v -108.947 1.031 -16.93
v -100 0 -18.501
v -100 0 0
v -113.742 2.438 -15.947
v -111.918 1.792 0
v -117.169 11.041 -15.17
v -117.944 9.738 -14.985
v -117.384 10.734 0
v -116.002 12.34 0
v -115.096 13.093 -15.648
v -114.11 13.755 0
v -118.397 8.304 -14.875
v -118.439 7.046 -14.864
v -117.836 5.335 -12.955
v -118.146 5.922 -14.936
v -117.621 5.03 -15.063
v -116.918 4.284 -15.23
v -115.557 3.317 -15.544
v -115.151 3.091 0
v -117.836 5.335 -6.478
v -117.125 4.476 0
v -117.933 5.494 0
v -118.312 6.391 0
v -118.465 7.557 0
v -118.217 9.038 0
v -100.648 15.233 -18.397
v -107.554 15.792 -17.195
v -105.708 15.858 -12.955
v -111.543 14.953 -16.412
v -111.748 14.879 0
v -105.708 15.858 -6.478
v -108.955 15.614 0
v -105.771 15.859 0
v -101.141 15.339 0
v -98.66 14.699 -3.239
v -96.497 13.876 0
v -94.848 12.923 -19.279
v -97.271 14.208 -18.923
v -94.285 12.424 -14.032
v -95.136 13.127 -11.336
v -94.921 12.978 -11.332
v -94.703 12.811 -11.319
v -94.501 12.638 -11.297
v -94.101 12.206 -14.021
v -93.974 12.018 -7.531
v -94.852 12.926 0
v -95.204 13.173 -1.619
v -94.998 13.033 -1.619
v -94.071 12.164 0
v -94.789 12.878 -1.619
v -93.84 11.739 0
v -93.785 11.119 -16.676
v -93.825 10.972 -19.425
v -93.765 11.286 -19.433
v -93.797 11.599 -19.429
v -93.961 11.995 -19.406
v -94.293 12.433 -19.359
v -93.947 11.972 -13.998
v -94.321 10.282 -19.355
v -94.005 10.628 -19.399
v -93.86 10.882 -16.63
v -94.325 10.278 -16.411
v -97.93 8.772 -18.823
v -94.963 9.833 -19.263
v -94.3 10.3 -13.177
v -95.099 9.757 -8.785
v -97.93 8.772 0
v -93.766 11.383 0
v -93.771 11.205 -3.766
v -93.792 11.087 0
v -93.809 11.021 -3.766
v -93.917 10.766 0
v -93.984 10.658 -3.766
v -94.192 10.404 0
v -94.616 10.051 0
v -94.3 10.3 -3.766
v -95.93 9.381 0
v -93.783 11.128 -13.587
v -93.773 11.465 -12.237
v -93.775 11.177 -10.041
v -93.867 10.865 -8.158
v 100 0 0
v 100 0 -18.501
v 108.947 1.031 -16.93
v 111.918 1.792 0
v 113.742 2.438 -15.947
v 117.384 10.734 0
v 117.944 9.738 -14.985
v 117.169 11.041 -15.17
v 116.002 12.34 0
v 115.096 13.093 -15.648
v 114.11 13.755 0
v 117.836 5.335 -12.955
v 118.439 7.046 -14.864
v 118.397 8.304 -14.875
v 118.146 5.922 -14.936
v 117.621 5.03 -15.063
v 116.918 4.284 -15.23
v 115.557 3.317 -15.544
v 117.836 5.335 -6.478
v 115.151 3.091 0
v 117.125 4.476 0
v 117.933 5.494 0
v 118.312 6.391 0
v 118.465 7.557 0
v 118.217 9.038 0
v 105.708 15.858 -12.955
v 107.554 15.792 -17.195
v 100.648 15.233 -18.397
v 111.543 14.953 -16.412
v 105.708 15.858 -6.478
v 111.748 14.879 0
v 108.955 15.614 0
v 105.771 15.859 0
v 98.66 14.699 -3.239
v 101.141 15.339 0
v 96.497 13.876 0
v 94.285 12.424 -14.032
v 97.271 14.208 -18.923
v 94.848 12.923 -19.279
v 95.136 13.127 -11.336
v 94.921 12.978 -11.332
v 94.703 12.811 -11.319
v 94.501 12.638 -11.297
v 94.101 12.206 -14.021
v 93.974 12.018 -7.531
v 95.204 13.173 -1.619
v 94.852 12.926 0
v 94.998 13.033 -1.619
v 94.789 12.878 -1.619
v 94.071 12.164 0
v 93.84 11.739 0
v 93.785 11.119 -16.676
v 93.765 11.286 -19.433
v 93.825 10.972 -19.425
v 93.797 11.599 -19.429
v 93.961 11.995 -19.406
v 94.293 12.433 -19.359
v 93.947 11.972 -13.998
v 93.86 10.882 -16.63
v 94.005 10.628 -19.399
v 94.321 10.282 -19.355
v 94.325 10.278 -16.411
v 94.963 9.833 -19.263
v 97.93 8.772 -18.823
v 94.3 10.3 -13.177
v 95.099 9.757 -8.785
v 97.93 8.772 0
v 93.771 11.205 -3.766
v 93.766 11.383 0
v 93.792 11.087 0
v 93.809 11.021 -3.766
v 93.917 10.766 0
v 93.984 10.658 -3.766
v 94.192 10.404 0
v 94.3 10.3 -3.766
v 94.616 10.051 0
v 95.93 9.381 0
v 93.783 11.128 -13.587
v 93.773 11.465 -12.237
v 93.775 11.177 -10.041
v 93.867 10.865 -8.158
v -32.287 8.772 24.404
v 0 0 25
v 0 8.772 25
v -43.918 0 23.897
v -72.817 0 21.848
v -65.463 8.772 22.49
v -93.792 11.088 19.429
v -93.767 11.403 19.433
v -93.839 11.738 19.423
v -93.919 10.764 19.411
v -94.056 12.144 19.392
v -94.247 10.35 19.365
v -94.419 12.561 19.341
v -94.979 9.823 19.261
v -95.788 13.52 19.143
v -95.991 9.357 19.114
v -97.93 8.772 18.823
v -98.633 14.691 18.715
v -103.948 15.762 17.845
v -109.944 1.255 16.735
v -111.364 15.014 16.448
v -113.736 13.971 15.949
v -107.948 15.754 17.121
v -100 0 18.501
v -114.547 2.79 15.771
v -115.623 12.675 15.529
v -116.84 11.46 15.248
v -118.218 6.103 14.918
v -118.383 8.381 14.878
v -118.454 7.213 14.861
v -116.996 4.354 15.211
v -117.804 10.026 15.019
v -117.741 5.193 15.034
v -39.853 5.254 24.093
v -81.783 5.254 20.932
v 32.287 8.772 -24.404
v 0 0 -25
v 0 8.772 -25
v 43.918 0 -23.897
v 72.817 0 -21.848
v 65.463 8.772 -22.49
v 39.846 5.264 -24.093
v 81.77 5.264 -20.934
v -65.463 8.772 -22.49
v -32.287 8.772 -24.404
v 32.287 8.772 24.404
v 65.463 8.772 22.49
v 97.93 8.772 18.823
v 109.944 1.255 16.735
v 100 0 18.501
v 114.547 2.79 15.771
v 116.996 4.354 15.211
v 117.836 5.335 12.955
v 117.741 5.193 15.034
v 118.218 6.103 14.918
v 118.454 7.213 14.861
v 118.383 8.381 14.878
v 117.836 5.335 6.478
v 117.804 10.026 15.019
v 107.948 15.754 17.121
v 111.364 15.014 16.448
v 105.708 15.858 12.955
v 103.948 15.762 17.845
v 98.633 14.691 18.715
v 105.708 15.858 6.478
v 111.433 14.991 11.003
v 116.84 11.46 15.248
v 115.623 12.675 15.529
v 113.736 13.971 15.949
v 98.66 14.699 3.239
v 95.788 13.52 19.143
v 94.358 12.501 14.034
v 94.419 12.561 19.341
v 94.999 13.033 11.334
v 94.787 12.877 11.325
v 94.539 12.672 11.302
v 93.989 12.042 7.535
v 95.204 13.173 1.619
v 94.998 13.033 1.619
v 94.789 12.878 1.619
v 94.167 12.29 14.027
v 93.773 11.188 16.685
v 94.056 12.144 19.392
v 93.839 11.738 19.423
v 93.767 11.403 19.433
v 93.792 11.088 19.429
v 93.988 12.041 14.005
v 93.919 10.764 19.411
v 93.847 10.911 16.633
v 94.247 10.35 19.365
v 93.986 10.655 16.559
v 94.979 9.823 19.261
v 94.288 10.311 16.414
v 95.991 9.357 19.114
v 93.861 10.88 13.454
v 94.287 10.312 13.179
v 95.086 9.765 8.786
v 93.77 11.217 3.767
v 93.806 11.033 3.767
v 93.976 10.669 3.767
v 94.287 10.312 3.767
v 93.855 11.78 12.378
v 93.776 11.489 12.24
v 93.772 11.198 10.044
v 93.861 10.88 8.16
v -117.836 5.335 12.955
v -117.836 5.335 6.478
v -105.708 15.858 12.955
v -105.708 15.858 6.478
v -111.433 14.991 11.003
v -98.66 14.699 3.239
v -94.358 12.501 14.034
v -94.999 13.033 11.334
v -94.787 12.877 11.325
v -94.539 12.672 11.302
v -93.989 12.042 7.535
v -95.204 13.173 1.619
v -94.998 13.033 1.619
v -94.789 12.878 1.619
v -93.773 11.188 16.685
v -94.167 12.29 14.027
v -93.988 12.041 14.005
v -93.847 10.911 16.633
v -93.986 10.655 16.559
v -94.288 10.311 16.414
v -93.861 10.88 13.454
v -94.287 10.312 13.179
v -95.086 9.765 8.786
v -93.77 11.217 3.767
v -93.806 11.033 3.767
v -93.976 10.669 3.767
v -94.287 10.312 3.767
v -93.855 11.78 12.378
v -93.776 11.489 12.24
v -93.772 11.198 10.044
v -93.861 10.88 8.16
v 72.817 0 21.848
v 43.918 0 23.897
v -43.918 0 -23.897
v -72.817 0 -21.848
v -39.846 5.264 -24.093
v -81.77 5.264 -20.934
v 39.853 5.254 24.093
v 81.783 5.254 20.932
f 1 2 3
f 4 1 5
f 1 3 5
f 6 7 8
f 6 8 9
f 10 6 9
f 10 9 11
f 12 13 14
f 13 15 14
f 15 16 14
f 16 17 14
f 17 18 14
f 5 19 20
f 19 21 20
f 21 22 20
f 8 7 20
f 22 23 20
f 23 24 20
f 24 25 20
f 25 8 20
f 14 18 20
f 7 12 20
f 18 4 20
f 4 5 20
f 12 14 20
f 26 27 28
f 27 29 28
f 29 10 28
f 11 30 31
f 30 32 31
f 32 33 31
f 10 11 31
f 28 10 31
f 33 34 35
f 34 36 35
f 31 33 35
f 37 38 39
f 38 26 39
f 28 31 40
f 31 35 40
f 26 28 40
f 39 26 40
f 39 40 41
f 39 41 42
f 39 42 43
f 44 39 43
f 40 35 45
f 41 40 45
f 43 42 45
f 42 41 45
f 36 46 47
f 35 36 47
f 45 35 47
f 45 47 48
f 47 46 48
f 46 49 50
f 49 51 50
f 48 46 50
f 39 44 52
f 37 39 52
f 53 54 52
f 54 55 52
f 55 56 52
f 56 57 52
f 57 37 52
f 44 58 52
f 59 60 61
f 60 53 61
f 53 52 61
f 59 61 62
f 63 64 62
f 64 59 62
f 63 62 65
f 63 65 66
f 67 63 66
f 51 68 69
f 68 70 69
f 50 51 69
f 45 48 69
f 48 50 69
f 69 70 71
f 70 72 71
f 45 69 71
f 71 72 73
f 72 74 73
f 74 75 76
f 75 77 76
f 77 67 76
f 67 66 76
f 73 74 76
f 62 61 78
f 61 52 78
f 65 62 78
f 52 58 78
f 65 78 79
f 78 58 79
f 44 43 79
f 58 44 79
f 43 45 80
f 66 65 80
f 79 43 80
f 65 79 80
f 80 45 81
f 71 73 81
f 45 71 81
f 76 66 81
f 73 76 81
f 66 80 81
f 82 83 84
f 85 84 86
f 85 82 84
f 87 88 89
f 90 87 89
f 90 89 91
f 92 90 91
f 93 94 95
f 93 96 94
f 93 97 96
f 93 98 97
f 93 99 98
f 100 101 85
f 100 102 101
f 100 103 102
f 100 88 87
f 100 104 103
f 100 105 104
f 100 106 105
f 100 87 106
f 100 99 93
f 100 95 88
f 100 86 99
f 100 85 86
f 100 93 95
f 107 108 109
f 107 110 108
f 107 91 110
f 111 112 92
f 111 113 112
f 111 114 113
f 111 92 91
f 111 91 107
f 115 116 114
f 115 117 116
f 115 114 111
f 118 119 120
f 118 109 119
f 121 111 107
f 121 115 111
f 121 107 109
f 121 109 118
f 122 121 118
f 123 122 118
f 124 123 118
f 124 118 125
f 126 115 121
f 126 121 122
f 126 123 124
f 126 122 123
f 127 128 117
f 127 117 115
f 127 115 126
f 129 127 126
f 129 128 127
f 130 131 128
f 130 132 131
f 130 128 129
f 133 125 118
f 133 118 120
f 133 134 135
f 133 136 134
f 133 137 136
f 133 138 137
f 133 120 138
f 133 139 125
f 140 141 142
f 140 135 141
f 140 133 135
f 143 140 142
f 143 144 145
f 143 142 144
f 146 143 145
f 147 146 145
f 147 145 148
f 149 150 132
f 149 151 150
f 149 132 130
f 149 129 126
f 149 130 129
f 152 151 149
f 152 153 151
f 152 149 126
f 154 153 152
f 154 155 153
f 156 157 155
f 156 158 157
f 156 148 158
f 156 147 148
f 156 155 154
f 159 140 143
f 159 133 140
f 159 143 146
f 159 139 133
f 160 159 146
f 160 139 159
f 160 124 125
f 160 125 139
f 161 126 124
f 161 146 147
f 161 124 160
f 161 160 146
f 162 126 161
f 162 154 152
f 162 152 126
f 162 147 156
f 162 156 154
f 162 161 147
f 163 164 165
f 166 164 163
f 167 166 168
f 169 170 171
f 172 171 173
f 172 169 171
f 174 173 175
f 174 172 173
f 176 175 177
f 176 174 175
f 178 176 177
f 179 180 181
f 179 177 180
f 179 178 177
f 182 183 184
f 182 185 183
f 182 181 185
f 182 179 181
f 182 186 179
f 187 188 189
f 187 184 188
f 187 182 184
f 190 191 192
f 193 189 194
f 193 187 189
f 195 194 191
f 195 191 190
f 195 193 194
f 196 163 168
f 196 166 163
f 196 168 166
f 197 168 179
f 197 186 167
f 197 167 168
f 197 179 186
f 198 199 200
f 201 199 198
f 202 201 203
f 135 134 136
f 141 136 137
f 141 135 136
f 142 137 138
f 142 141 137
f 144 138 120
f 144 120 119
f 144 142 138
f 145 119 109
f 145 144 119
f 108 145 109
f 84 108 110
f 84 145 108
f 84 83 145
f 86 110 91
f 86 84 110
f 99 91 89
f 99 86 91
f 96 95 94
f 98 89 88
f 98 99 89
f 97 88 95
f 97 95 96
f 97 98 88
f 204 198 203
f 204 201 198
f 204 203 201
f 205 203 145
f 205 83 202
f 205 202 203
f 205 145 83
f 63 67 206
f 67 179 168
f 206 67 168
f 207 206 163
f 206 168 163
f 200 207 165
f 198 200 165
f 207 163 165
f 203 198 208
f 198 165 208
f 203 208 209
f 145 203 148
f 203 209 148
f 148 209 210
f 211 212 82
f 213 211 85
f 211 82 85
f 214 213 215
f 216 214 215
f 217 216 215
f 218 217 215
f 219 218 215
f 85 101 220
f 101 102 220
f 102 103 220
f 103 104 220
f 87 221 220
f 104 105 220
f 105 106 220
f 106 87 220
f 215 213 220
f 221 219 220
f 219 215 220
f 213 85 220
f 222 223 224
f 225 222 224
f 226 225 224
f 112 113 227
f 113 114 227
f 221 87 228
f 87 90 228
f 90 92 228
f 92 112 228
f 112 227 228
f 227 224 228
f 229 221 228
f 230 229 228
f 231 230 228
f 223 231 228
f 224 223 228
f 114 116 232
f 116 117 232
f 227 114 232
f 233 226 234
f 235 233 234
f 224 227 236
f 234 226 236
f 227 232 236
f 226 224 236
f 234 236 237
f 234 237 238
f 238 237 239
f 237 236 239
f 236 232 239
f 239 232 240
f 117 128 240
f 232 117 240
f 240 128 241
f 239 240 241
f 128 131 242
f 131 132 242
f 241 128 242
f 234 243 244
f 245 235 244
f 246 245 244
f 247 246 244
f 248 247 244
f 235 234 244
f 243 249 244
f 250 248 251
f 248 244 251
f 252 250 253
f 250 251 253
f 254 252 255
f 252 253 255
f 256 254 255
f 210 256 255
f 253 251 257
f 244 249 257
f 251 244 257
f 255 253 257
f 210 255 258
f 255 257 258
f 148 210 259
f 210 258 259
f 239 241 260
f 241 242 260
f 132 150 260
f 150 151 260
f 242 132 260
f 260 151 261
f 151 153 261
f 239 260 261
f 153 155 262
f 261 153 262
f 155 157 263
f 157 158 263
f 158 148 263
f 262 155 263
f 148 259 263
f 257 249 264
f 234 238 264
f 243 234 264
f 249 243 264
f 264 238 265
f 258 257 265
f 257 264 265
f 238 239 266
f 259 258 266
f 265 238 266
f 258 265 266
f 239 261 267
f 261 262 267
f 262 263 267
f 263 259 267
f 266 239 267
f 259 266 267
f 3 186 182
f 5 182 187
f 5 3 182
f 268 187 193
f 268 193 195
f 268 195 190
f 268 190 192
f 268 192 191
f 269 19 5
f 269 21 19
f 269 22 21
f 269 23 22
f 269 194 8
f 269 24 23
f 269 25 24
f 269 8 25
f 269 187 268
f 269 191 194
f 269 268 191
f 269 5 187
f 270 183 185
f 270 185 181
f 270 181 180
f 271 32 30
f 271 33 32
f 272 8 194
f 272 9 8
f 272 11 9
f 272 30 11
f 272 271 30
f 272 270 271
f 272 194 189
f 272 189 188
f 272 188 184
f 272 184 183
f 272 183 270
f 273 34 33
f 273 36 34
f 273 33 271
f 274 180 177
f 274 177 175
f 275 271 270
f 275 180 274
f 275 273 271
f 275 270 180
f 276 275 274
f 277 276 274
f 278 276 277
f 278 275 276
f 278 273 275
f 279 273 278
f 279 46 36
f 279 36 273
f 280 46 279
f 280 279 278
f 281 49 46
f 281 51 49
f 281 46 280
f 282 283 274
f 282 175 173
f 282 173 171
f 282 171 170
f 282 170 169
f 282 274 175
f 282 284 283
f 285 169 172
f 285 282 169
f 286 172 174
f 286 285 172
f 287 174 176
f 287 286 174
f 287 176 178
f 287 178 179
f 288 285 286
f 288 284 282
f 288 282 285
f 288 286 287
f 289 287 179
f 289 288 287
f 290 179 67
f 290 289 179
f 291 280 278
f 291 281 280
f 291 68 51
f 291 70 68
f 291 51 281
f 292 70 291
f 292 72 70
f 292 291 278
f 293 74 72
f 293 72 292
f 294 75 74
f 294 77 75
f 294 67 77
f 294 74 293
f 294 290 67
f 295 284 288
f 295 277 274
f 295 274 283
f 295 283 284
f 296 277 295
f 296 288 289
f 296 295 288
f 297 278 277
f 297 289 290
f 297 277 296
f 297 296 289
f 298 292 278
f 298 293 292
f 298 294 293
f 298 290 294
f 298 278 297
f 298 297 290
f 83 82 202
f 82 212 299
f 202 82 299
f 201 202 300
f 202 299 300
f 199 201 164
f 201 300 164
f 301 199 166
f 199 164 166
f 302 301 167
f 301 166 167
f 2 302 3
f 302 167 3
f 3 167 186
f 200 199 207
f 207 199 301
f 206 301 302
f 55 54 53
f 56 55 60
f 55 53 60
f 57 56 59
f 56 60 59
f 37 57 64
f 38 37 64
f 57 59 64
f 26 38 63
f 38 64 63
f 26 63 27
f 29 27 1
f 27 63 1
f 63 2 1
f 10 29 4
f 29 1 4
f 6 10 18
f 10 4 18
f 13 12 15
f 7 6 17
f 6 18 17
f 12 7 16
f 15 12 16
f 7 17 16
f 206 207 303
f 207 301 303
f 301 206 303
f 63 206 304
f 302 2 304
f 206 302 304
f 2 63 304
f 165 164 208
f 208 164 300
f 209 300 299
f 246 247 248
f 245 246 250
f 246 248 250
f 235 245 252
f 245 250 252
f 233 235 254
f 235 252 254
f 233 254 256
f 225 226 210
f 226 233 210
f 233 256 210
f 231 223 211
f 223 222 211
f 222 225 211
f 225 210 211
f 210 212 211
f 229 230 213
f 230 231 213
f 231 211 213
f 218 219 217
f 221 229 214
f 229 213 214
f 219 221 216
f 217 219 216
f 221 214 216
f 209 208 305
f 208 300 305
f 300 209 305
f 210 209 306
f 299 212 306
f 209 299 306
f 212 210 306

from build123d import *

# Parameters (mm, degrees)
F1_DEPTH      = 25
F1_DEPTH_BACK = 25
F3_DEPTH      = 15.8610146991


with BuildPart() as f1:
    # F0 (on Top) → F1 (new body, two sides)
    with BuildSketch(Plane.XY) as f1_sk:
        with BuildLine():
            Line((0, 8.7716327729), (0, 0))
            Line((0, 0), (100, 0))
            add(Edge.make_bspline(
                [(100, 0), (103.3047086604, 0), (126.0781351696, 2.0802962722), (110.7634703086, 21.3984059812), (87.918486092, 11.1951300923), (97.9303441448, 8.7716327729)],
                knots=[0, 0, 0, 0, 0.3730608547, 0.7195326557, 1, 1, 1, 1], degree=3))
            Line((97.9303441448, 8.7716327729), (0, 8.7716327729))
        make_face()
    extrude(amount=F1_DEPTH)
    extrude(f1_sk.sketch, amount=-F1_DEPTH_BACK)

    # F2 (on Front) → F3 (cut, through all)
    with BuildSketch(Plane.XZ):
        with BuildLine():
            Line((149.6758162975, 30.9919379652), (0, 25))
            add(Edge.make_bspline(
                [(0, 25), (53.5370744765, 25), (137.6725584269, 19.814517349), (147.0988926594, 0)],
                knots=[0, 0, 0, 0, 149.2081908664, 149.2081908664, 149.2081908664, 149.2081908664], degree=3))
            Line((147.0988926594, 0), (149.6758162975, 30.9919379652))
        make_face()
        with BuildLine():
            Line((149.6758162975, -30.9919379652), (147.0988926594, 0))
            add(Edge.make_bspline(
                [(0, -25), (53.5370744765, -25), (137.6725584269, -19.814517349), (147.0988926594, 0)],
                knots=[0, 0, 0, 0, 149.2081908664, 149.2081908664, 149.2081908664, 149.2081908664], degree=3))
            Line((0, -25), (149.6758162975, -30.9919379652))
        make_face()
    extrude(amount=-F3_DEPTH, mode=Mode.SUBTRACT)

    # F4: F1 across plane


with BuildPart() as f1_1:
    add(f1.part)
    add(f1.part.mirror(Plane.YZ))


solid = f1_1.part
